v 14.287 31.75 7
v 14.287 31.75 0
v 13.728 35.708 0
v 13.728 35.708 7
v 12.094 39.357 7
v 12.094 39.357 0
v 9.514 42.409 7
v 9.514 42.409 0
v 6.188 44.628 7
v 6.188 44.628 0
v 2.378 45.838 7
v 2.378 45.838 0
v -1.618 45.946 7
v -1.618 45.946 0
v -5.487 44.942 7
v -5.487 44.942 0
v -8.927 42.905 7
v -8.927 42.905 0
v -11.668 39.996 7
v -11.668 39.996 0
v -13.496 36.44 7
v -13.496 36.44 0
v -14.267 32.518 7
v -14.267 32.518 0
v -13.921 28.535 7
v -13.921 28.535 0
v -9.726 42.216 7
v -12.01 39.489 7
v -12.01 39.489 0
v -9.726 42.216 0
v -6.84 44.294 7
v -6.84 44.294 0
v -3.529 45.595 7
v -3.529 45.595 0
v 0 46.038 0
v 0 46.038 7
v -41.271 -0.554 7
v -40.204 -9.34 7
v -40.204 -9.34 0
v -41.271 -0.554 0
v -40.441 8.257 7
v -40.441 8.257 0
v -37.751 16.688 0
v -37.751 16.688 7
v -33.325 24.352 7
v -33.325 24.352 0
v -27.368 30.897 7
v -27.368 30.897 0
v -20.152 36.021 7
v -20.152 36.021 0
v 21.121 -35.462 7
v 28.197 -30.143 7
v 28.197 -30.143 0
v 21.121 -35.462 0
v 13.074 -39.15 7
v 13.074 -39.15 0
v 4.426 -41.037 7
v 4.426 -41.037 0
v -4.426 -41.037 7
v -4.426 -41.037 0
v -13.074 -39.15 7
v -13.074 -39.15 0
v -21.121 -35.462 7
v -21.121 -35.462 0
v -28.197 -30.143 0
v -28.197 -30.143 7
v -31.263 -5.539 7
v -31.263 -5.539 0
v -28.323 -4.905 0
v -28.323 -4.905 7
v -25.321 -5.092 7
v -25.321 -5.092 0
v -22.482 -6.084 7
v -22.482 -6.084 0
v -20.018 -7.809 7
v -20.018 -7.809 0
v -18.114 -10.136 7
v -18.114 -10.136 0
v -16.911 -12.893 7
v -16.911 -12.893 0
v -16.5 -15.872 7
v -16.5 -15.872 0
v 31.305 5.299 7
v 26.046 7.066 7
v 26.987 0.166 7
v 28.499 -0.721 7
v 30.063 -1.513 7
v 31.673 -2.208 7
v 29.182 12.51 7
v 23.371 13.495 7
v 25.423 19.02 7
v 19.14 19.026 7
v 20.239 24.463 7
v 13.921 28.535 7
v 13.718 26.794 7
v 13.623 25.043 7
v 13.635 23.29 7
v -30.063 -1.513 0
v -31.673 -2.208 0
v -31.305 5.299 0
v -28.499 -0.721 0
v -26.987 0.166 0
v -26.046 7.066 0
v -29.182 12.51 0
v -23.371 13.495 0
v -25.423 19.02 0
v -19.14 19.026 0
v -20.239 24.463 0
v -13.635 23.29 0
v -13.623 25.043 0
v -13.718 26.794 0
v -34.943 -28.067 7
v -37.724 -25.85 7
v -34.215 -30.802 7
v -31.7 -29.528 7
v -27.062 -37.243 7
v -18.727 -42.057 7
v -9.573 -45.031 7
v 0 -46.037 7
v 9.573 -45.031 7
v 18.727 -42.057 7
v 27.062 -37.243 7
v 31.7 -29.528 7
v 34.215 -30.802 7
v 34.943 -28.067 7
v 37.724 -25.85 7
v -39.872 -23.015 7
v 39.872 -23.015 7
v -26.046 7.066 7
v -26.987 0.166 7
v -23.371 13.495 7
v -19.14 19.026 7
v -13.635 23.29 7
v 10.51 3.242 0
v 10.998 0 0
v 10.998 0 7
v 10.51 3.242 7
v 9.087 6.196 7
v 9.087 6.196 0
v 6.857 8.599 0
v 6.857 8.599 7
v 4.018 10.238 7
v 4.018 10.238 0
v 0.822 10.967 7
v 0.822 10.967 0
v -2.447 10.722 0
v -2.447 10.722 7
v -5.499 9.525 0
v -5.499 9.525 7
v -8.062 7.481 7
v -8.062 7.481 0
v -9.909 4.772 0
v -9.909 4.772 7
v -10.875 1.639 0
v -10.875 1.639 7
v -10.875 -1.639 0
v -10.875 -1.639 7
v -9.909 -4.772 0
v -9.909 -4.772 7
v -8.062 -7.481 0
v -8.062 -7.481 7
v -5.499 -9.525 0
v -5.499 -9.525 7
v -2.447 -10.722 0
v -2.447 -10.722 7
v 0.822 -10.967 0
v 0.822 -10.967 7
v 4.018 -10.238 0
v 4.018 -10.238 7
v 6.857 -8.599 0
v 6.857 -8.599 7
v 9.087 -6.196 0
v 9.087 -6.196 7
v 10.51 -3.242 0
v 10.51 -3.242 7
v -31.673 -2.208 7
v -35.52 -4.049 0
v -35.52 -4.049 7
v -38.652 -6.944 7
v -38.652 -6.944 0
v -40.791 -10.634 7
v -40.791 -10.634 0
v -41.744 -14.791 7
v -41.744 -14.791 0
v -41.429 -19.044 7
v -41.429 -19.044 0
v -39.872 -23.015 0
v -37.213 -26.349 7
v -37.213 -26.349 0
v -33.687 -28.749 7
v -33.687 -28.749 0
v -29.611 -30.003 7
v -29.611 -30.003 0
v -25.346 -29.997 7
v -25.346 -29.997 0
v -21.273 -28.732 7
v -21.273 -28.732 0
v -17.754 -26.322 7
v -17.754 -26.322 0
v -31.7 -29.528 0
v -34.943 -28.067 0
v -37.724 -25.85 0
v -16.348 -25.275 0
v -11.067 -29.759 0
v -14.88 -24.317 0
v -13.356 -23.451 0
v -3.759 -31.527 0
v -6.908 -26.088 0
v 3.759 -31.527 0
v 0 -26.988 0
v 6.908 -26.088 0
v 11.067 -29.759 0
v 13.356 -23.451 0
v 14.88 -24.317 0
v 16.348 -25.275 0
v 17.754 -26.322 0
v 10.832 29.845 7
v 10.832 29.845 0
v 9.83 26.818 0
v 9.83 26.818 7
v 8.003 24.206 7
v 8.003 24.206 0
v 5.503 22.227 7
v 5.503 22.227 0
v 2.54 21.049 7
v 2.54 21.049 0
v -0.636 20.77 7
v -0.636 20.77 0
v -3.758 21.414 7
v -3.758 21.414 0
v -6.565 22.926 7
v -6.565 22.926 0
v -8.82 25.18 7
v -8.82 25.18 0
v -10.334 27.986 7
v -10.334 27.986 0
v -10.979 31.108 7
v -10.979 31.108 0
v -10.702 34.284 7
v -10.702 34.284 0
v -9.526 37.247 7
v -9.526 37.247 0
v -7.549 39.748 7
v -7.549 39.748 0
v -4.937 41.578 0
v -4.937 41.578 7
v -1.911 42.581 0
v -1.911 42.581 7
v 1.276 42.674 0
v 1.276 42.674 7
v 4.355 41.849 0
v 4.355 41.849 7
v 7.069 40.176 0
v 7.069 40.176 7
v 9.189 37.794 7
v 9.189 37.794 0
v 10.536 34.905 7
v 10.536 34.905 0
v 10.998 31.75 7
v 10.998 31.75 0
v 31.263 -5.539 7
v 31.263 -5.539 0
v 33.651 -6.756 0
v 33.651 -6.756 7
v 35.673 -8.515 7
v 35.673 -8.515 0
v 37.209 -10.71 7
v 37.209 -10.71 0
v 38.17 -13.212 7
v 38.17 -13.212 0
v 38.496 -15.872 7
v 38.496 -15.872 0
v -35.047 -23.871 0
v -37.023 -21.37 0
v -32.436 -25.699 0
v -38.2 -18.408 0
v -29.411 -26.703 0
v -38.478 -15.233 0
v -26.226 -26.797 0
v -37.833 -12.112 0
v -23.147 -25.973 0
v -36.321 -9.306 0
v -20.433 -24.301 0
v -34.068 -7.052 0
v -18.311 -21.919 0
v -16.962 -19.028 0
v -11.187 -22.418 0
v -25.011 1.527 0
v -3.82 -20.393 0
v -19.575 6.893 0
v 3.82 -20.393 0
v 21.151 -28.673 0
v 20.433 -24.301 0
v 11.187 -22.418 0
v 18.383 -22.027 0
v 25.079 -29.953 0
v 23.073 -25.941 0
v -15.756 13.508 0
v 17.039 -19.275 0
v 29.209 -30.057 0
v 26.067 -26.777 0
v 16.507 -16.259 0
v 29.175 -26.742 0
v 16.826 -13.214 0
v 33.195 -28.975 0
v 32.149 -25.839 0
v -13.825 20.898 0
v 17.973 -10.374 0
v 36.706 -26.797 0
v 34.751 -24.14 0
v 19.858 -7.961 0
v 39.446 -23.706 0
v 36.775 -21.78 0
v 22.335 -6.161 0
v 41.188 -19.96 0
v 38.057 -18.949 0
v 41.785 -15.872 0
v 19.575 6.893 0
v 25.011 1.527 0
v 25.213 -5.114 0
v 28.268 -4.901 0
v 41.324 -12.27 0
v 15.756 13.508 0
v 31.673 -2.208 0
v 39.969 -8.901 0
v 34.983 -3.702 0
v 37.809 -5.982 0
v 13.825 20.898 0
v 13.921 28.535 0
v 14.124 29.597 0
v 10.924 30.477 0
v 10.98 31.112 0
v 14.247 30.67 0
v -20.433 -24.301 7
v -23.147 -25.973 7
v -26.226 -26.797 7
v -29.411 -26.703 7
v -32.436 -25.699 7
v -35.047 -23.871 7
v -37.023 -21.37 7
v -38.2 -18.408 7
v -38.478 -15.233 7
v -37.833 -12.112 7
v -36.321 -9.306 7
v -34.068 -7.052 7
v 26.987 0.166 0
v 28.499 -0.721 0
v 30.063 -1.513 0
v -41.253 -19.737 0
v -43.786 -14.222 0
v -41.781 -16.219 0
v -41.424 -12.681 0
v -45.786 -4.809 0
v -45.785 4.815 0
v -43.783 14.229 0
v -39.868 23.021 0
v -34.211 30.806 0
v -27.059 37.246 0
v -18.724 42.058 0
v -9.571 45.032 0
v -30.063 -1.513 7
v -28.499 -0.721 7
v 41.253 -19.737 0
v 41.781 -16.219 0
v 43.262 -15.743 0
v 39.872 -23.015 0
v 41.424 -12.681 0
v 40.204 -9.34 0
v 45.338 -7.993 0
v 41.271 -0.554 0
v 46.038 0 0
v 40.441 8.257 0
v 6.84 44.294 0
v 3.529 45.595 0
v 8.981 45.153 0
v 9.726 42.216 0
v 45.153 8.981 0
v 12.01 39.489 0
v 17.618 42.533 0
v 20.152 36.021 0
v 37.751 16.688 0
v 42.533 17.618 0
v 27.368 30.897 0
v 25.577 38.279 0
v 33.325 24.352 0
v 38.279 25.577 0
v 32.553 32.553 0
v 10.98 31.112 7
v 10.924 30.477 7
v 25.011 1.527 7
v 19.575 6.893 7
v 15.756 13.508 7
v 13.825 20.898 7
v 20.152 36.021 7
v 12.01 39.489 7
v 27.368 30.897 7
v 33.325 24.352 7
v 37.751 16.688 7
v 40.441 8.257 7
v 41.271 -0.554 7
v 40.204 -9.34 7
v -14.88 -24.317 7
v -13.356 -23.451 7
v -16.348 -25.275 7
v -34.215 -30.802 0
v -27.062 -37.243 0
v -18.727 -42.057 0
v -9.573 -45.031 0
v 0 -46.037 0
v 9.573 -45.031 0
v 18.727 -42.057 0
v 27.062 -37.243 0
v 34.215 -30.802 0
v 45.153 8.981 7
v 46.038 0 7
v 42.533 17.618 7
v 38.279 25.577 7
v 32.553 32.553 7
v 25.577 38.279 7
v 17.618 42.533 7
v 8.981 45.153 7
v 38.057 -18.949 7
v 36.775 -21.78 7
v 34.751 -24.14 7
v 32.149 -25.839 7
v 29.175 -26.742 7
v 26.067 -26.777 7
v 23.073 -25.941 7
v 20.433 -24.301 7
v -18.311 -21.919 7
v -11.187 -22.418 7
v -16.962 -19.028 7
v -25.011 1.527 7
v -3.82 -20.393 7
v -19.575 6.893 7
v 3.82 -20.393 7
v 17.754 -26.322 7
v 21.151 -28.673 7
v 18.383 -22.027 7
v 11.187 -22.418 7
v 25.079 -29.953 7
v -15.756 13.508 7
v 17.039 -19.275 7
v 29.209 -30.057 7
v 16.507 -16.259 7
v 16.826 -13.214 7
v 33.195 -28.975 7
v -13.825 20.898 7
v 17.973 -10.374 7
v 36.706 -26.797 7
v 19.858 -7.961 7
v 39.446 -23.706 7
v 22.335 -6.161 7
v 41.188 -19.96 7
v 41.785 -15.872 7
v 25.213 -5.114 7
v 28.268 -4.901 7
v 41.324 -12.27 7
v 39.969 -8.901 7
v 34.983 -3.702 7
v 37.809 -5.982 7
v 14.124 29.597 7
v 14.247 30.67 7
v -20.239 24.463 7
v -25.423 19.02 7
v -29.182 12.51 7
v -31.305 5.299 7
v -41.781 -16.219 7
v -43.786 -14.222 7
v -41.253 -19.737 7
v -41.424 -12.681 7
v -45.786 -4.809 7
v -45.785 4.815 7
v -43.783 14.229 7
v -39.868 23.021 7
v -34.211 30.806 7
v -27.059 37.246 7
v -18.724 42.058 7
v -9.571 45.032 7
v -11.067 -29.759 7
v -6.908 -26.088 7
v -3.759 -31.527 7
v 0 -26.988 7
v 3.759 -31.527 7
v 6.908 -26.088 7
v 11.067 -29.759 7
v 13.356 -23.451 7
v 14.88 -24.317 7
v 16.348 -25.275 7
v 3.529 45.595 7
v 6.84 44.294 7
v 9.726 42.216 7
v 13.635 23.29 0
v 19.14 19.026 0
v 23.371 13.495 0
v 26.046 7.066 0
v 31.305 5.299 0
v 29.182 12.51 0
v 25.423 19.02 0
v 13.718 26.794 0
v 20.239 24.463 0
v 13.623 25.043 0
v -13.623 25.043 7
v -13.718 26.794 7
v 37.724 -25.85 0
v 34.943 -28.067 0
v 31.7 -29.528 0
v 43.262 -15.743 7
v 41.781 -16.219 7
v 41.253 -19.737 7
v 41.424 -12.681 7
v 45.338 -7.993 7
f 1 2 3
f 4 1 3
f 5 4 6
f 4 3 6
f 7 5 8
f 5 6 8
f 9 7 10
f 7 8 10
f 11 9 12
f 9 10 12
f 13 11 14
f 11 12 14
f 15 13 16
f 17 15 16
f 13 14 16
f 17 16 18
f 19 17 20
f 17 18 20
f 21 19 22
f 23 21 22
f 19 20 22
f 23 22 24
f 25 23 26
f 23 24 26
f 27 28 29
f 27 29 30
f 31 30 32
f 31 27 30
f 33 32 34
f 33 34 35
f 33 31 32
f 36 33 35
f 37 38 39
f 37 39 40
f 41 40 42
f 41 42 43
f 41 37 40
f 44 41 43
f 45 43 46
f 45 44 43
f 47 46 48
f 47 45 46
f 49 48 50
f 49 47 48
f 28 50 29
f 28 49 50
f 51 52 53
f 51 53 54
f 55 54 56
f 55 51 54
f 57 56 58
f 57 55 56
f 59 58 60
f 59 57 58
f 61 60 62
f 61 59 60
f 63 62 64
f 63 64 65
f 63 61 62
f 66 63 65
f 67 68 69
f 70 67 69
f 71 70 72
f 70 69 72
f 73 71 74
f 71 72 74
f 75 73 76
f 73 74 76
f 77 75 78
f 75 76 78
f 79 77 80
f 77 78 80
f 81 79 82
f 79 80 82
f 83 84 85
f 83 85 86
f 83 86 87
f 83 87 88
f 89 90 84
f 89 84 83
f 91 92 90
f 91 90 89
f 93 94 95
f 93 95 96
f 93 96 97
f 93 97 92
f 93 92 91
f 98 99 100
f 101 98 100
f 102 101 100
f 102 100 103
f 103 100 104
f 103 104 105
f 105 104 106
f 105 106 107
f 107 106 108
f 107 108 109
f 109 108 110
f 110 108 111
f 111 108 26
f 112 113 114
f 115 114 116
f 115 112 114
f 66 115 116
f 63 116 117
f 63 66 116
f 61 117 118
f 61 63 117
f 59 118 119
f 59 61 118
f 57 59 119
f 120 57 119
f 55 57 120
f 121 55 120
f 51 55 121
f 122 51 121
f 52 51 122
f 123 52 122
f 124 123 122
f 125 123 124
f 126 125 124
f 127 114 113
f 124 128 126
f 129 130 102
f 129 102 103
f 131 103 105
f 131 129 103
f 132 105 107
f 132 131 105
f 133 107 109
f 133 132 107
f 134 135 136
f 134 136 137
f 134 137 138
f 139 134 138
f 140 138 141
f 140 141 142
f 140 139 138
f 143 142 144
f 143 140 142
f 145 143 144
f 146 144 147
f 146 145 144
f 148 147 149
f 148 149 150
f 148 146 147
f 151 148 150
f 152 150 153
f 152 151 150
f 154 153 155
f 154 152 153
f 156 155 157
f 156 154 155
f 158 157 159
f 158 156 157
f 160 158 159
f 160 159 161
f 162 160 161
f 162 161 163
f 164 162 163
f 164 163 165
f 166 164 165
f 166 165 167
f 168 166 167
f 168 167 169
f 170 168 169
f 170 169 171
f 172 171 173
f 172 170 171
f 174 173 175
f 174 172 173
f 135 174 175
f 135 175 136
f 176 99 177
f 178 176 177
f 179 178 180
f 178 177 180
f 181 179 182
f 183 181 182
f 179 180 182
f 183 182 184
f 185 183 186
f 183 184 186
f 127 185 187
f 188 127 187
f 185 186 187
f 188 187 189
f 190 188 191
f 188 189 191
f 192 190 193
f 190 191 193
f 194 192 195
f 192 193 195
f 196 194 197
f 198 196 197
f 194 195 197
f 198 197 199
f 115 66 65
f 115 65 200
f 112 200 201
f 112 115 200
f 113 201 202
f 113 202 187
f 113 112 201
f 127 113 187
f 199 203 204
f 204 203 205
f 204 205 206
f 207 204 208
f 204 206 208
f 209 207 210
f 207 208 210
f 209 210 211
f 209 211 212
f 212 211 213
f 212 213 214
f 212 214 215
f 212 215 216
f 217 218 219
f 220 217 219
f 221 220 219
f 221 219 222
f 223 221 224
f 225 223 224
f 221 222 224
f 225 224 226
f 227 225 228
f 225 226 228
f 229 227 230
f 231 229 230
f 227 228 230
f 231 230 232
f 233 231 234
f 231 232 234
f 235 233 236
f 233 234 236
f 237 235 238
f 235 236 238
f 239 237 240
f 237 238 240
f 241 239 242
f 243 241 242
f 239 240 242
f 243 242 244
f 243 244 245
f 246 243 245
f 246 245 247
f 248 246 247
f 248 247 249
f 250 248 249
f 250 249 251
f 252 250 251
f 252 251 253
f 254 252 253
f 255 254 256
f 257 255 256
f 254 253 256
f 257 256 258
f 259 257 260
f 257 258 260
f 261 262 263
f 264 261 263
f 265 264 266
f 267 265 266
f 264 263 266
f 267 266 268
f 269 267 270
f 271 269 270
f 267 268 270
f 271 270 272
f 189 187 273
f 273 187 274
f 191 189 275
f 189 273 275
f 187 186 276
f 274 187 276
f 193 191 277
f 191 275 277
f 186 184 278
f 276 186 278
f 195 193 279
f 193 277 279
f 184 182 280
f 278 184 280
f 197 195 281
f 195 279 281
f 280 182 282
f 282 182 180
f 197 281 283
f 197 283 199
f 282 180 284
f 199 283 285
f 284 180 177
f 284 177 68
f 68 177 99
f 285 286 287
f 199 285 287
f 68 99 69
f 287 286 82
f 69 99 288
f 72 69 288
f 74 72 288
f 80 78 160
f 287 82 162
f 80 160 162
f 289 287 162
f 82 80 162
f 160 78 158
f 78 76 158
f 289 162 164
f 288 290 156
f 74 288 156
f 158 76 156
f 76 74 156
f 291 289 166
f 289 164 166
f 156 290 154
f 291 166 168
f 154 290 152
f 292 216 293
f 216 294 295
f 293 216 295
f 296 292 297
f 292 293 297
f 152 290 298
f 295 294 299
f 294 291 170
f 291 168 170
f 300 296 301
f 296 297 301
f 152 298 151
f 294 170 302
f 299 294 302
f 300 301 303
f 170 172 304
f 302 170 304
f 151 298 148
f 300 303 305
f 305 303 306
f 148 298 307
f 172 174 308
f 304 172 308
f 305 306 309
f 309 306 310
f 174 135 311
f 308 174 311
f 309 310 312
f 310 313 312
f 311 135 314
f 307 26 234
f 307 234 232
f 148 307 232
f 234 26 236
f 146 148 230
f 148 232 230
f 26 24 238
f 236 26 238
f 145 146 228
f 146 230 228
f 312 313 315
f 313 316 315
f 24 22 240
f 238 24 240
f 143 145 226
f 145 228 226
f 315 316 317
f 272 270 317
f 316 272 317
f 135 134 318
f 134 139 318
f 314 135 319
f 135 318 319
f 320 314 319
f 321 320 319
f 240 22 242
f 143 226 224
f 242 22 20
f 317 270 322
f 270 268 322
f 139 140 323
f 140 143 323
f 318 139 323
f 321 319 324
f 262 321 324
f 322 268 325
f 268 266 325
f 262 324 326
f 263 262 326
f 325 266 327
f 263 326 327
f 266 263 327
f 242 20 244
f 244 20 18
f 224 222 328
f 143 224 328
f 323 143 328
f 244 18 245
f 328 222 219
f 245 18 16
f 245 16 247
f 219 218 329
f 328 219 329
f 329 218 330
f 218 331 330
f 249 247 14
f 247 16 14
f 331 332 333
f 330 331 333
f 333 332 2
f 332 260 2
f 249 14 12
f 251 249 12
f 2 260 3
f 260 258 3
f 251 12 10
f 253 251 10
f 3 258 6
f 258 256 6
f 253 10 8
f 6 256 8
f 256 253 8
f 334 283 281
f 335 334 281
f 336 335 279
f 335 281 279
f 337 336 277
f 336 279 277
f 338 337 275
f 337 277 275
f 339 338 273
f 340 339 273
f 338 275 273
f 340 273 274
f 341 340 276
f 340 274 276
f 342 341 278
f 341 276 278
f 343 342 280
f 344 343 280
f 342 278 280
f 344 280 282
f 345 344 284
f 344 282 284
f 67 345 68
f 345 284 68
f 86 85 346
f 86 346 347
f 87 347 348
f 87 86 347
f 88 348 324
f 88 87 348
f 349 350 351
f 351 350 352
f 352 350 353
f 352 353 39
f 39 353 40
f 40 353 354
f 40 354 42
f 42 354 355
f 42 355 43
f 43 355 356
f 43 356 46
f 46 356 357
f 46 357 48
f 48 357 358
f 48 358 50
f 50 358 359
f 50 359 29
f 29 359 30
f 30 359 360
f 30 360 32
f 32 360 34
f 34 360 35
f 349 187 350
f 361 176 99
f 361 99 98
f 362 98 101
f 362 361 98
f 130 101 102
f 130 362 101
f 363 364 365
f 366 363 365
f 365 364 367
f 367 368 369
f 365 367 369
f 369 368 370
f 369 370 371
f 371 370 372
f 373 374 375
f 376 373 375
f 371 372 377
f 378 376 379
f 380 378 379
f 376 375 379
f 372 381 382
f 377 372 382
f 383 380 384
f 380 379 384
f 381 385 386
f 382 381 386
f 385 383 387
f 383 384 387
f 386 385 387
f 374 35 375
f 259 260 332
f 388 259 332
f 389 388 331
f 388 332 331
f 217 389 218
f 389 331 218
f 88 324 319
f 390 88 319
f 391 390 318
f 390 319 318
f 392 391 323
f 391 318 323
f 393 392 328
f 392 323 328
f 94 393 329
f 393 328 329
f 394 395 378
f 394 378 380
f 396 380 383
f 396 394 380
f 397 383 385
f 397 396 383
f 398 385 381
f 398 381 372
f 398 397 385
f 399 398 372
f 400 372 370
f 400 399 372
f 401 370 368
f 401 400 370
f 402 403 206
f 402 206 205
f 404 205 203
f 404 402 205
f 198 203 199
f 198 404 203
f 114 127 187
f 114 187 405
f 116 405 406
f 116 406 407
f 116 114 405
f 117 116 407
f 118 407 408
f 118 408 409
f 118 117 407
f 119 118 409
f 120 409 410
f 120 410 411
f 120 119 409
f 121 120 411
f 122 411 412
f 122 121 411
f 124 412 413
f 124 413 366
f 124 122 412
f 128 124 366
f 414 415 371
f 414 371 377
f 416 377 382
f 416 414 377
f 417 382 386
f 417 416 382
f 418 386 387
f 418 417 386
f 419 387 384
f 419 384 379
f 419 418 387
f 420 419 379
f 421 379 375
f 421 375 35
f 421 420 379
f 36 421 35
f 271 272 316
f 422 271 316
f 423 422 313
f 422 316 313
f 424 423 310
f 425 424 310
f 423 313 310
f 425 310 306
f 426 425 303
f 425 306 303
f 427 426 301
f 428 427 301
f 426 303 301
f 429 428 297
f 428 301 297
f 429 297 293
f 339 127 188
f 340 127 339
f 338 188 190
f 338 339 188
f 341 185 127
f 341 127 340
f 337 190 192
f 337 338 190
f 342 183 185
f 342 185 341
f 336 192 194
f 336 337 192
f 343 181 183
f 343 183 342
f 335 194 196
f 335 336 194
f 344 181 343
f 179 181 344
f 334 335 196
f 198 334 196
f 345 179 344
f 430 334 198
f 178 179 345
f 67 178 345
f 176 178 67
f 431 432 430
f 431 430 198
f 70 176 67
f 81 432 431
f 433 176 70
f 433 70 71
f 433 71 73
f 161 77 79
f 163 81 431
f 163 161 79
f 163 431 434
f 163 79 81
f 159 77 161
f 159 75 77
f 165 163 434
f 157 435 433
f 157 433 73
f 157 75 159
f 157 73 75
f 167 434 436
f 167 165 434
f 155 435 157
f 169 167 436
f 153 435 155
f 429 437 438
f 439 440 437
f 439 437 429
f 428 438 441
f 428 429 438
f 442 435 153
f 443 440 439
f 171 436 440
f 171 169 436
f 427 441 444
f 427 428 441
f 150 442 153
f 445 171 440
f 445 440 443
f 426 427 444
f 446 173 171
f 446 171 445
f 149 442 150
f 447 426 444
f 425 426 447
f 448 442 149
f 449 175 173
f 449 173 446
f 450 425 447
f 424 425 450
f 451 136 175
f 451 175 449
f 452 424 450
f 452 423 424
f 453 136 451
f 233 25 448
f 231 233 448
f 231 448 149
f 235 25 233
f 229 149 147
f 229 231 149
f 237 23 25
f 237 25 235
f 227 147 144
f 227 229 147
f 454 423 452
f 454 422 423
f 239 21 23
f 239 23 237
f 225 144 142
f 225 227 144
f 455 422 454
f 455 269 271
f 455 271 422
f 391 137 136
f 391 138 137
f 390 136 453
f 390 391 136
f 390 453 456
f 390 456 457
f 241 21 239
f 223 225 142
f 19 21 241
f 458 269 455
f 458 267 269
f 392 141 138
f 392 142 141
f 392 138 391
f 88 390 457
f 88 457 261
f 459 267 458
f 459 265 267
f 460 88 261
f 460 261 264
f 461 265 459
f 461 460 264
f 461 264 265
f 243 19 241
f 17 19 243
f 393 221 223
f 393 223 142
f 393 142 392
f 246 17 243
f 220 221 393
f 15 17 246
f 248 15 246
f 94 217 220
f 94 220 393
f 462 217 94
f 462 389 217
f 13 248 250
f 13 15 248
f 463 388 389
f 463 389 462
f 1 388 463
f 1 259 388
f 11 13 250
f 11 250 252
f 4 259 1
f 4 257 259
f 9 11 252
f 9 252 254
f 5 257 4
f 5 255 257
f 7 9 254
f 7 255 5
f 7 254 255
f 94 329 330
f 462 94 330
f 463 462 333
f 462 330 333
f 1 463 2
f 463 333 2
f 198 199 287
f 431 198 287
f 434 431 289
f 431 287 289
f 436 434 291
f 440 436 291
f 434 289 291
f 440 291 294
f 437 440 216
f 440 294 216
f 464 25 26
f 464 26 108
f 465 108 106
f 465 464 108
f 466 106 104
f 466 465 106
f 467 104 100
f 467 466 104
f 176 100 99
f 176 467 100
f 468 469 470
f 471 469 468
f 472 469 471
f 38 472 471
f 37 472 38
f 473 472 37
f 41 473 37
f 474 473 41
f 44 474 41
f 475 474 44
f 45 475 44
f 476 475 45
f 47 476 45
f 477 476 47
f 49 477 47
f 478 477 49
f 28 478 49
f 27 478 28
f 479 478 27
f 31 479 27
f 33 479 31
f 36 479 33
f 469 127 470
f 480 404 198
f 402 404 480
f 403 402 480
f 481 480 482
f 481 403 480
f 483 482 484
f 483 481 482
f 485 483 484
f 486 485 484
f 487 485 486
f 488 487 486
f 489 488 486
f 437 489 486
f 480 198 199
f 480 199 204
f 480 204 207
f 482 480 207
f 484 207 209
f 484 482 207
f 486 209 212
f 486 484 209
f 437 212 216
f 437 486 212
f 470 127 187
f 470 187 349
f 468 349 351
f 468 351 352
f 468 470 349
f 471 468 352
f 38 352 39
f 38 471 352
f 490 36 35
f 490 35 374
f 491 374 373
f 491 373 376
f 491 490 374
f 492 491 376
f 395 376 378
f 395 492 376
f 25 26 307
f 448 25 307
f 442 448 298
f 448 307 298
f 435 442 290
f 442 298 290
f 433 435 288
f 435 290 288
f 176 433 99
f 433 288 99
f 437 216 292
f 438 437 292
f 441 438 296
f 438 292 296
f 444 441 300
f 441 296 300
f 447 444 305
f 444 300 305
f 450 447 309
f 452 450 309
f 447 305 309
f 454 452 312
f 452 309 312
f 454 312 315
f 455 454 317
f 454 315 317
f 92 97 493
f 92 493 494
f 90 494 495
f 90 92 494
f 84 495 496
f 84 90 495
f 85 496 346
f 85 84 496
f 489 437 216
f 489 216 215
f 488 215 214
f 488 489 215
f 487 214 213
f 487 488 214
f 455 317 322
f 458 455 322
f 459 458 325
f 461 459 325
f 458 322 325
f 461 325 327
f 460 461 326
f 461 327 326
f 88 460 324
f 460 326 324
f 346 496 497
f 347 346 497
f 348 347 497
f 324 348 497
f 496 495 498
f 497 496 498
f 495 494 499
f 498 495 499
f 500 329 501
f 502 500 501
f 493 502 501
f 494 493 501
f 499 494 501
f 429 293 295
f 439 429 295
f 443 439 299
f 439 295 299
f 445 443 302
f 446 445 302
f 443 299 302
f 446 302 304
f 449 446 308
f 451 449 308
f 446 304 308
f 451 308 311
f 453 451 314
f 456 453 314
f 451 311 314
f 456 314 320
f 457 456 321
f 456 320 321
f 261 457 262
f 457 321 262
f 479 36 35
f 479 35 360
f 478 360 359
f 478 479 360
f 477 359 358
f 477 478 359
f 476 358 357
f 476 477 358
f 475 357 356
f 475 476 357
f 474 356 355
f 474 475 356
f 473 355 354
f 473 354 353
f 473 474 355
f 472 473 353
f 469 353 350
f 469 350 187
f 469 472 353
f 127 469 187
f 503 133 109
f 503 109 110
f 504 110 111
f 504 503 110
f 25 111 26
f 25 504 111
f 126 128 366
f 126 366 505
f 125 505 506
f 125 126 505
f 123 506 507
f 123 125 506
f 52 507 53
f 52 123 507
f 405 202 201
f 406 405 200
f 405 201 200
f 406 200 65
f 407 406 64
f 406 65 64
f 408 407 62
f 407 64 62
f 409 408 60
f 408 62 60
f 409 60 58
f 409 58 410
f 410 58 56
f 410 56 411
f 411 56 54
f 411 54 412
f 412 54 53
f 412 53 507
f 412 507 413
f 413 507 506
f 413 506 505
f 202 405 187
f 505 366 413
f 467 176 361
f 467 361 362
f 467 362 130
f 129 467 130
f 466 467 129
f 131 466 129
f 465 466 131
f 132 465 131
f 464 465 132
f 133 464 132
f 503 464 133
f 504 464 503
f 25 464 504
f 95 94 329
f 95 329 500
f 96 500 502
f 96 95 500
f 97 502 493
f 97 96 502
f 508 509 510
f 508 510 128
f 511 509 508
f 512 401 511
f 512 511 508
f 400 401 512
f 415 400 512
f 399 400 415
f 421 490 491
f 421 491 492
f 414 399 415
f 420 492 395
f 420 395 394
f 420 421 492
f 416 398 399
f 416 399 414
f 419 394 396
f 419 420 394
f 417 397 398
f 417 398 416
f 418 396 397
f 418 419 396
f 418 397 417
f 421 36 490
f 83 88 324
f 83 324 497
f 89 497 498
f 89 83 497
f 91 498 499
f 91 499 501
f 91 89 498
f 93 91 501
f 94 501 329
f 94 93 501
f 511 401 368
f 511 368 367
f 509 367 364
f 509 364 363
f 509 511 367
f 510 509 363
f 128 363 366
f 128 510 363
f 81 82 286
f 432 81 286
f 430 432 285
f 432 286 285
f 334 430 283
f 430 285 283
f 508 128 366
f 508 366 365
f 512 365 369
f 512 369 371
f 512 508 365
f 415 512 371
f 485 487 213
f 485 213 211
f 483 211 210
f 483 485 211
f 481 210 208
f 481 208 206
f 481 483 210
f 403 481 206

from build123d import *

# Parameters (mm, degrees)
F0_R     = 10.9982
F1_DEPTH = 7
F3_DEPTH = 7


with BuildPart() as f1:
    # F0 (on Top) → F1 (new body)
    with BuildSketch(Plane.XY):
        with BuildLine():
            ThreePointArc((14.2875, 31.75), (-1.6177474644, 45.94561726), (-13.9211508334, 28.5353125))
            ThreePointArc((-13.9211508334, 28.5353125), (-12.3938804515, 29.2310490293), (-10.8319806145, 29.84511176))
            ThreePointArc((-10.8319806145, 29.84511176), (-0.9560632943, 42.7065663516), (10.9982, 31.75))
            ThreePointArc((10.9982, 31.75), (10.9565663516, 30.7939367057), (10.8319806145, 29.84511176))
            ThreePointArc((10.8319806145, 29.84511176), (12.3938804515, 29.2310490293), (13.9211508334, 28.5353125))
            ThreePointArc((13.9211508334, 28.5353125), (14.19561726, 30.1322525356), (14.2875, 31.75))
        make_face()
        with BuildLine():
            ThreePointArc((-10.8319806145, 29.84511176), (-12.3938804515, 29.2310490293), (-13.9211508334, 28.5353125))
            ThreePointArc((-13.9211508334, 28.5353125), (0, 17.4625), (13.9211508334, 28.5353125))
            ThreePointArc((13.9211508334, 28.5353125), (12.3938804515, 29.2310490293), (10.8319806145, 29.84511176))
            ThreePointArc((10.8319806145, 29.84511176), (0, 20.7518), (-10.8319806145, 29.84511176))
        make_face()
        with BuildLine():
            ThreePointArc((-13.9211508334, 28.5353125), (-17.4436657319, 10.0722867823), (-31.6731055039, -2.2083676644))
            ThreePointArc((-31.6731055039, -2.2083676644), (-18.9985169837, -4.3877463628), (-13.2104194975, -15.872206))
            ThreePointArc((-13.2104194975, -15.872206), (-14.3955700405, -21.5696699055), (-17.754404793, -26.3219226206))
            ThreePointArc((-17.754404793, -26.3219226206), (0, -20.1369144797), (17.754404793, -26.3219226206))
            ThreePointArc((17.754404793, -26.3219226206), (15.1238557237, -8.7297133), (31.6731055039, -2.2083676644))
            ThreePointArc((31.6731055039, -2.2083676644), (17.4436657319, 10.0722867823), (13.9211508334, 28.5353125))
            ThreePointArc((13.9211508334, 28.5353125), (0, 17.4625), (-13.9211508334, 28.5353125))
        make_face()
        Circle(F0_R, mode=Mode.SUBTRACT)
        with BuildLine():
            ThreePointArc((31.6731055039, -2.2083676644), (15.1238557237, -8.7297133), (17.754404793, -26.3219226206))
            ThreePointArc((17.754404793, -26.3219226206), (19.1204664369, -25.3469971246), (20.4331040274, -24.3012501696))
            ThreePointArc((20.4331040274, -24.3012501696), (17.9726401836, -10.3740738416), (31.2631782133, -5.5386088507))
            ThreePointArc((31.2631782133, -5.5386088507), (31.5121655654, -3.8789072401), (31.6731055039, -2.2083676644))
        make_face()
        with BuildLine():
            ThreePointArc((20.4331040274, -24.3012501696), (19.1204664369, -25.3469971246), (17.754404793, -26.3219226206))
            ThreePointArc((17.754404793, -26.3219226206), (33.195383403, -28.9745554571), (41.7854194975, -15.872206))
            ThreePointArc((41.7854194975, -15.872206), (38.9823791347, -7.3728034862), (31.6731055039, -2.2083676644))
            ThreePointArc((31.6731055039, -2.2083676644), (31.5121655654, -3.8789072401), (31.2631782133, -5.5386088507))
            ThreePointArc((31.2631782133, -5.5386088507), (36.5082322459, -9.5654899436), (38.4961194975, -15.872206))
            ThreePointArc((38.4961194975, -15.872206), (32.1487339282, -25.8386661726), (20.4331040274, -24.3012501696))
        make_face()
        with BuildLine():
            ThreePointArc((-13.2104194975, -15.872206), (-18.9985169837, -4.3877463628), (-31.6731055039, -2.2083676644))
            ThreePointArc((-31.6731055039, -2.2083676644), (-31.5121655654, -3.8789072401), (-31.2631782133, -5.5386088507))
            ThreePointArc((-31.2631782133, -5.5386088507), (-21.1912034411, -6.8618932516), (-16.4997194975, -15.872206))
            ThreePointArc((-16.4997194975, -15.872206), (-17.531459325, -20.5230204306), (-20.4331040274, -24.3012501696))
            ThreePointArc((-20.4331040274, -24.3012501696), (-19.1204664369, -25.3469971246), (-17.754404793, -26.3219226206))
            ThreePointArc((-17.754404793, -26.3219226206), (-14.3955700405, -21.5696699055), (-13.2104194975, -15.872206))
        make_face()
        with BuildLine():
            ThreePointArc((-31.2631782133, -5.5386088507), (-31.5121655654, -3.8789072401), (-31.6731055039, -2.2083676644))
            ThreePointArc((-31.6731055039, -2.2083676644), (-39.8719832714, -23.0146987), (-17.754404793, -26.3219226206))
            ThreePointArc((-17.754404793, -26.3219226206), (-19.1204664369, -25.3469971246), (-20.4331040274, -24.3012501696))
            ThreePointArc((-20.4331040274, -24.3012501696), (-37.0231988115, -21.3703381584), (-31.2631782133, -5.5386088507))
        make_face()
    extrude(amount=F1_DEPTH)


with BuildPart() as f3:
    # F2 (on face) → F3 (new body)
    with BuildSketch(Plane.XY.offset(7)):
        with BuildLine():
            ThreePointArc((-12.0099778464, 39.4890625), (-6.8396199042, 44.2940127478), (-7.2e-09, 46.0375))
            ThreePointArc((-7.2e-09, 46.0375), (-39.8684755679, 23.0207745773), (-39.8719821395, -23.014700661))
            ThreePointArc((-39.8719821395, -23.014700661), (-41.7811984871, -16.2194775883), (-40.2044694202, -9.3395001814))
            ThreePointArc((-40.2044694202, -9.3395001814), (-35.74415, 20.6393160201), (-12.0099778464, 39.4890625))
        make_face()
    extrude(amount=-F3_DEPTH)


with BuildPart() as f3b:
    # F2 (on face) → F3, piece 2 (new body)
    with BuildSketch(Plane.XY.offset(7)):
        with BuildLine():
            ThreePointArc((39.871982137, -23.0147006653), (44.4694152417, -11.9131236168), (46.0375, 0))
            ThreePointArc((46.0375, 0), (32.5534284363, 32.5534284414), (-7.2e-09, 46.0375))
            ThreePointArc((-7.2e-09, 46.0375), (6.8396198979, 44.2940127512), (12.0099778464, 39.4890625))
            ThreePointArc((12.0099778464, 39.4890625), (35.74415, 20.6393160201), (40.2044694202, -9.3395001814))
            ThreePointArc((40.2044694202, -9.3395001814), (41.7811984871, -16.2194775908), (39.871982137, -23.0147006653))
        make_face()
    extrude(amount=-F3_DEPTH)


with BuildPart() as f3c:
    # F2 (on face) → F3, piece 3 (new body)
    with BuildSketch(Plane.XY.offset(7)):
        with BuildLine():
            ThreePointArc((31.6731055039, -2.2083676644), (27.4955, 15.8763969385), (13.9211508334, 28.5353125))
            ThreePointArc((13.9211508334, 28.5353125), (13.6571299997, 25.9192105589), (13.63469832, 23.2899153707))
            ThreePointArc((13.63469832, 23.2899153707), (23.371175, 13.4949373978), (26.9869908173, 0.1657795997))
            ThreePointArc((26.9869908173, 0.1657795997), (29.2753746807, -1.1292090724), (31.6731055039, -2.2083676644))
        make_face()
    extrude(amount=-F3_DEPTH)


with BuildPart() as f3d:
    # F2 (on face) → F3, piece 4 (new body)
    with BuildSketch(Plane.XY.offset(7)):
        with BuildLine():
            ThreePointArc((-13.63469832, 23.2899153707), (-13.6571299997, 25.9192105589), (-13.9211508334, 28.5353125))
            ThreePointArc((-13.9211508334, 28.5353125), (-27.4955, 15.8763969385), (-31.6731055039, -2.2083676644))
            ThreePointArc((-31.6731055039, -2.2083676644), (-29.2753746807, -1.1292090724), (-26.9869908173, 0.1657795997))
            ThreePointArc((-26.9869908173, 0.1657795997), (-23.371175, 13.4949373978), (-13.63469832, 23.2899153707))
        make_face()
    extrude(amount=-F3_DEPTH)


with BuildPart() as f3e:
    # F2 (on face) → F3, piece 5 (new body)
    with BuildSketch(Plane.XY.offset(7)):
        with BuildLine():
            ThreePointArc((-17.754404793, -26.3219226206), (0, -31.75), (17.754404793, -26.3219226206))
            ThreePointArc((17.754404793, -26.3219226206), (15.6215531983, -24.7849903006), (13.3564788322, -23.450578446))
            ThreePointArc((13.3564788322, -23.450578446), (0, -26.9875), (-13.3564788322, -23.450578446))
            ThreePointArc((-13.3564788322, -23.450578446), (-15.6215531983, -24.7849903006), (-17.754404793, -26.3219226206))
        make_face()
    extrude(amount=-F3_DEPTH)


with BuildPart() as f3f:
    # F2 (on face) → F3, piece 6 (new body)
    with BuildSketch(Plane.XY.offset(7)):
        with BuildLine():
            ThreePointArc((-39.8719821395, -23.014700661), (-2.5e-09, -46.0375), (39.871982137, -23.0147006653))
            ThreePointArc((39.871982137, -23.0147006653), (34.9427814183, -28.066741138), (28.1966053299, -30.1426122436))
            ThreePointArc((28.1966053299, -30.1426122436), (0, -41.275), (-28.1966053299, -30.1426122436))
            ThreePointArc((-28.1966053299, -30.1426122436), (-34.9427814204, -28.0667411367), (-39.8719821395, -23.014700661))
        make_face()
    extrude(amount=-F3_DEPTH)


solid = Compound([f1.part, f3.part, f3b.part, f3c.part, f3d.part, f3e.part, f3f.part])
